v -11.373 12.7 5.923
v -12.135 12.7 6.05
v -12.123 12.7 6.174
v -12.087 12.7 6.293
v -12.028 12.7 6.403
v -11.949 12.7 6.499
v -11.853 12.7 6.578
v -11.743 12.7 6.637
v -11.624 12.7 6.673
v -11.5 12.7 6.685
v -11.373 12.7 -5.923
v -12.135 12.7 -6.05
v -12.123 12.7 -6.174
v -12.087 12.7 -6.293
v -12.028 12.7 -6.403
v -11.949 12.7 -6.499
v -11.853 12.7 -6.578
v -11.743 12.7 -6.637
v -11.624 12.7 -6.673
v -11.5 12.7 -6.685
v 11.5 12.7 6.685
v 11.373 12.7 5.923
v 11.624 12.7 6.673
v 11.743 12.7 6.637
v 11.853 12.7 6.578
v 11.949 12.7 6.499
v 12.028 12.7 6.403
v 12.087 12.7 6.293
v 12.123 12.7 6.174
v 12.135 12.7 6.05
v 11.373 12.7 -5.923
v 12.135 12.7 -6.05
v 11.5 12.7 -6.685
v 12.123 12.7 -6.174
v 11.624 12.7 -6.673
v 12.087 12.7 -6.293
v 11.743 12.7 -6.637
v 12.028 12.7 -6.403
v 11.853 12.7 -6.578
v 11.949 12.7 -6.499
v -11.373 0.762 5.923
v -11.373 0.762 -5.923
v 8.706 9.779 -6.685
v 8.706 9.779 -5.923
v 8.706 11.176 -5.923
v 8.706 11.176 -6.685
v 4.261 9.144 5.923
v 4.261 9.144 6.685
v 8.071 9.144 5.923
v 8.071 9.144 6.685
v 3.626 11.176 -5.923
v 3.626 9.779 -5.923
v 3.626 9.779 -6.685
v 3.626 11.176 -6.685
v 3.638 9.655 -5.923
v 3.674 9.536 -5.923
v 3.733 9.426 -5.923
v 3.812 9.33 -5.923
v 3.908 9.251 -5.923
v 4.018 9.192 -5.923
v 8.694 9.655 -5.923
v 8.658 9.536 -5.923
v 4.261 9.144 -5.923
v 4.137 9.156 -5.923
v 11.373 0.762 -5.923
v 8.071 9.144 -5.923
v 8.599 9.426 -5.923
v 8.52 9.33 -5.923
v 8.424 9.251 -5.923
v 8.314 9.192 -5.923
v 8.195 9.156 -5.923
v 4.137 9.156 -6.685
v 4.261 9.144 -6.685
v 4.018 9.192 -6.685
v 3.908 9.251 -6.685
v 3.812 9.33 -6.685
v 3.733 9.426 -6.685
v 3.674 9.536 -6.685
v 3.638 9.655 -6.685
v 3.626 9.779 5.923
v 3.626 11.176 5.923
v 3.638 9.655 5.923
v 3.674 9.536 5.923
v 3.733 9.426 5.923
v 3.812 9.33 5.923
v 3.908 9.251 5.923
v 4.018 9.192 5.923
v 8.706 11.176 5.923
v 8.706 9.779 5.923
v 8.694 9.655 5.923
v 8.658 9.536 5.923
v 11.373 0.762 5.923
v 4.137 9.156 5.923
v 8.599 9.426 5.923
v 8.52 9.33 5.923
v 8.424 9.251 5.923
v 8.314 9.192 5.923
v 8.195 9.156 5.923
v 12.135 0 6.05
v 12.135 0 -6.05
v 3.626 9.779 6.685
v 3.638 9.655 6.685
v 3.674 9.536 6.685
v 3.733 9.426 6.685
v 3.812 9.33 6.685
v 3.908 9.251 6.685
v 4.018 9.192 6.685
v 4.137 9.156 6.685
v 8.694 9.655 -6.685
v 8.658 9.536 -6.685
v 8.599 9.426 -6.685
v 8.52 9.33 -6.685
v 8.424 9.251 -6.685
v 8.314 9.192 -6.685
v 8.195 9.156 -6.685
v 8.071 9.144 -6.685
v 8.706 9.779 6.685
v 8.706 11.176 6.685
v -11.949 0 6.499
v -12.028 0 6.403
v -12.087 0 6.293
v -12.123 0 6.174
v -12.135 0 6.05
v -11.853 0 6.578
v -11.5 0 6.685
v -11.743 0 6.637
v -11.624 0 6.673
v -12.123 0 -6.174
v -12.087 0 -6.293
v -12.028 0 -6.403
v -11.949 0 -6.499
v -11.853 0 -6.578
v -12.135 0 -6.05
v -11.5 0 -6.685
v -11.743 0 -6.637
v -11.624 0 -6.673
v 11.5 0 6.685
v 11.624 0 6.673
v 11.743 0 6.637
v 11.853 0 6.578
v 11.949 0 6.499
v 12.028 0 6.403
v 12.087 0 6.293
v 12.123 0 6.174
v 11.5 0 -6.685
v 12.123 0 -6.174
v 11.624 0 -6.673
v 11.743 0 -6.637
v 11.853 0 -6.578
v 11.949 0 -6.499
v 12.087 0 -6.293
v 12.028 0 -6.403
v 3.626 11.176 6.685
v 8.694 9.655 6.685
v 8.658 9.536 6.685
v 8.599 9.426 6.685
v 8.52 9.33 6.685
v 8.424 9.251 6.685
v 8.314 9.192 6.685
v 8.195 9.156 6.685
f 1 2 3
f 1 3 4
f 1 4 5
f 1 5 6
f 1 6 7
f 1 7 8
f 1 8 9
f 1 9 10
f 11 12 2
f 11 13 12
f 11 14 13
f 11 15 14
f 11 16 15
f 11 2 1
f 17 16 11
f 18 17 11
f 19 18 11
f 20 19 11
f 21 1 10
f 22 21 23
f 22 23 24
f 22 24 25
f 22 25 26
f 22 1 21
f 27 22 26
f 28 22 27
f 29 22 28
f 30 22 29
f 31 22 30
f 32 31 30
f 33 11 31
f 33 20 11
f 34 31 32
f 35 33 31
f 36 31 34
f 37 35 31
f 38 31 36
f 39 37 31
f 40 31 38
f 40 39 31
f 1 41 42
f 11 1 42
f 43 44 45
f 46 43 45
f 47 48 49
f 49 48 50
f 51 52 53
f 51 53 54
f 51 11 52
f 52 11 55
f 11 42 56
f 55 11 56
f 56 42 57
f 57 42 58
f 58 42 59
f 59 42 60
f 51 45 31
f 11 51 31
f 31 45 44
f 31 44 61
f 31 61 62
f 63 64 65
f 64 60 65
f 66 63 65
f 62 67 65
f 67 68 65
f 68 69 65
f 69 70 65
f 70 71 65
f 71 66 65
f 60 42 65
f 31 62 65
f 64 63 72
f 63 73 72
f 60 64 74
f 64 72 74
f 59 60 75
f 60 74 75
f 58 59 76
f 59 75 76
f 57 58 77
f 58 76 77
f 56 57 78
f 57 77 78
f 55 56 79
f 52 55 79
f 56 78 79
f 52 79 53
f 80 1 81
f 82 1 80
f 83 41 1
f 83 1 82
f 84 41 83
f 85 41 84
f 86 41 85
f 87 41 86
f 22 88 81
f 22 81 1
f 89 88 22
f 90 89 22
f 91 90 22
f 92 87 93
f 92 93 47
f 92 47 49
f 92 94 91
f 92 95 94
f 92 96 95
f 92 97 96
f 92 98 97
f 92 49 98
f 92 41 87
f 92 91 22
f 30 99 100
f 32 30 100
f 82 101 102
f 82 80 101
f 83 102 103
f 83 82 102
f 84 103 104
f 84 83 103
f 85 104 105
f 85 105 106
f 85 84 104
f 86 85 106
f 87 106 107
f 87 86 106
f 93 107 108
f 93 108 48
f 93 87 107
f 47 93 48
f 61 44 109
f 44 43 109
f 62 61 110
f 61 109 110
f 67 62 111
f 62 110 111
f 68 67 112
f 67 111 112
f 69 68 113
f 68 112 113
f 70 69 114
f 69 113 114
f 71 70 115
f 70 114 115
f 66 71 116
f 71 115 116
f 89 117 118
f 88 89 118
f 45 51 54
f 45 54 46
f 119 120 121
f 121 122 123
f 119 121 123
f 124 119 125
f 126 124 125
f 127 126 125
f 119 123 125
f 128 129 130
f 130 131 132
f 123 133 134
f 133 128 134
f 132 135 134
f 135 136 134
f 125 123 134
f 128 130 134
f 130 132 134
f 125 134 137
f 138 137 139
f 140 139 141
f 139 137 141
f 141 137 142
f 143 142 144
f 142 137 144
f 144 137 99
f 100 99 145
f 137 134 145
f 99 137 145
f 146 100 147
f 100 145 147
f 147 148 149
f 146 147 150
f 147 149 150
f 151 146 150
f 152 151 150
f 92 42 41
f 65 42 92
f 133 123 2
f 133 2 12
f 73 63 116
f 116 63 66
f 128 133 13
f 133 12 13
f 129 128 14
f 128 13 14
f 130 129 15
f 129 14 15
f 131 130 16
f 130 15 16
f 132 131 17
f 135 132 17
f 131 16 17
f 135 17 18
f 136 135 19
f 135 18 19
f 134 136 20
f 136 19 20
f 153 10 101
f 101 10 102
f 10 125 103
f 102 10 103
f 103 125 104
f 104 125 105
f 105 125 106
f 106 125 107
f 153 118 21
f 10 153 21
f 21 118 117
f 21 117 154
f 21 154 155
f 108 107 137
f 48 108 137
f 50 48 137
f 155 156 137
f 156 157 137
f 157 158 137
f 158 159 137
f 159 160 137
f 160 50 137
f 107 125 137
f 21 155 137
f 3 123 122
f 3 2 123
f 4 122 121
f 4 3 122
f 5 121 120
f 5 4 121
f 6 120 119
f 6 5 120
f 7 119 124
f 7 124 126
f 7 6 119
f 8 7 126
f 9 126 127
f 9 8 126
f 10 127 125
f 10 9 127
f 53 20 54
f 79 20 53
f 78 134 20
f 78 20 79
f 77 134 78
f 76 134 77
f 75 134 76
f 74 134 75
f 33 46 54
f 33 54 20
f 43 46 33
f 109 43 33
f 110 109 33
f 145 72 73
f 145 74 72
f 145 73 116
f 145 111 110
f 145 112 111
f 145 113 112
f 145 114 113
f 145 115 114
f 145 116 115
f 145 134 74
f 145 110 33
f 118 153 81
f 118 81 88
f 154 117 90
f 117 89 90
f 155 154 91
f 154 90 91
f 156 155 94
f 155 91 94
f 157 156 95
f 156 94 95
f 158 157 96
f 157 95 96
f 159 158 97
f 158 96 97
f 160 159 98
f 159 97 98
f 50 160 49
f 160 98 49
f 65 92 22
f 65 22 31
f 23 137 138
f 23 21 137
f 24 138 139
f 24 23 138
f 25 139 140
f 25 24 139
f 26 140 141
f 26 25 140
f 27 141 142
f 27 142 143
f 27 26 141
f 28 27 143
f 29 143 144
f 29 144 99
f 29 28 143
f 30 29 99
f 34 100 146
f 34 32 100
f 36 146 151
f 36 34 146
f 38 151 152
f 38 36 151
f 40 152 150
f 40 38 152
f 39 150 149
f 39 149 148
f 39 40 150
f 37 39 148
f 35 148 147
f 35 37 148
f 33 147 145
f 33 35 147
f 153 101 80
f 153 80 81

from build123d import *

# Parameters (mm, degrees)
SKETCH1_W           = 24.2700048
SKETCH1_H           = 13.3700012
BOSS_EXTRUDE1_DEPTH = 12.7
SHELL1_T            = -0.762
FILLET1_R           = 0.635
SKETCH2_W           = 5.08
SKETCH2_H           = 2.032
CUT_EXTRUDE1_DEPTH  = 23.074990721
FILLET2_R           = 0.635


with BuildPart() as part:
    # Sketch1 → Boss-Extrude1 (new body)
    with BuildSketch(Plane(origin=(0, 0, 0), x_dir=(1, 0, 0), z_dir=(0, 1, 0))):
        Rectangle(SKETCH1_W, SKETCH1_H)
    extrude(amount=BOSS_EXTRUDE1_DEPTH)

    # Shell1
    shell1_openings = [part.faces().sort_by_distance(p)[0] for p in [
        (0, 12.7, 0),
    ]]
    offset(amount=SHELL1_T, openings=shell1_openings, kind=Kind.INTERSECTION)

    # Fillet1
    fillet1_edges = [part.edges().sort_by_distance(p)[0] for p in [
        (12.1350024, 6.35, 6.6850006),
        (-12.1350024, 6.35, 6.6850006),
        (-12.1350024, 6.35, -6.6850006),
        (12.1350024, 6.35, -6.6850006),
    ]]
    fillet(fillet1_edges, radius=FILLET1_R)

    # Sketch2 → Cut-Extrude1 (cut, through all)
    with BuildSketch(Plane.XY.offset(6.6850006)):
        with Locations((6.1660024, 10.16)):
            Rectangle(SKETCH2_W, SKETCH2_H)
    extrude(amount=-CUT_EXTRUDE1_DEPTH, mode=Mode.SUBTRACT)

    # Fillet2
    fillet2_edges = [part.edges().sort_by_distance(p)[0] for p in [
        (8.7060024, 9.144, -6.3040006),
        (3.6260024, 9.144, -6.3040006),
        (8.7060024, 9.144, 6.3040006),
        (3.6260024, 9.144, 6.3040006),
    ]]
    fillet(fillet2_edges, radius=FILLET2_R)


solid = part.part
